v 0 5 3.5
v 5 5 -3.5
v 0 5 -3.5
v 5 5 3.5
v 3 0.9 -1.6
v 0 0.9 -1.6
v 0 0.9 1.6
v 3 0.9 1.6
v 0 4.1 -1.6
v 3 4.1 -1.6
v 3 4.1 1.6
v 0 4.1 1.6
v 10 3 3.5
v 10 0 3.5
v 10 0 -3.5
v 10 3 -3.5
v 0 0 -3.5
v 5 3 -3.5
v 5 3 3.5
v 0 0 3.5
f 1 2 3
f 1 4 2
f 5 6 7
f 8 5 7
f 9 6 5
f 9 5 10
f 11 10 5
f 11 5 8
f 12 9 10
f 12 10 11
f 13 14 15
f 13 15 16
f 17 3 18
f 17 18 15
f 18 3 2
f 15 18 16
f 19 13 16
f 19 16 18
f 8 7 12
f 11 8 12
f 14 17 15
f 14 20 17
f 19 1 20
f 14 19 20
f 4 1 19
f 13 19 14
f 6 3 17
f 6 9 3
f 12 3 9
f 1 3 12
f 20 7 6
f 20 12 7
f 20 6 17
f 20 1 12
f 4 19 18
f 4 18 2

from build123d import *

# Parameters (mm, degrees)
EXTRUDE_1_DEPTH     = 3.5
SKETCH_2_W          = 3.2
SKETCH_2_H          = 3.2
CUT_EXTRUDE_1_DEPTH = 3


with BuildPart() as part:
    # 草图1 → 凸台-拉伸1 (new, symmetric)
    with BuildSketch(Plane.XY):
        Polygon((0, 0), (10, 0), (10, 3), (5, 3), (5, 5), (0, 5), align=None)
    extrude(amount=EXTRUDE_1_DEPTH, both=True)

    # 草图2 → 切除-拉伸1 (cut)
    with BuildSketch(Plane.ZY):
        with Locations((0, 2.5)):
            Rectangle(SKETCH_2_W, SKETCH_2_H)
    extrude(amount=-CUT_EXTRUDE_1_DEPTH, mode=Mode.SUBTRACT)


solid = part.part
